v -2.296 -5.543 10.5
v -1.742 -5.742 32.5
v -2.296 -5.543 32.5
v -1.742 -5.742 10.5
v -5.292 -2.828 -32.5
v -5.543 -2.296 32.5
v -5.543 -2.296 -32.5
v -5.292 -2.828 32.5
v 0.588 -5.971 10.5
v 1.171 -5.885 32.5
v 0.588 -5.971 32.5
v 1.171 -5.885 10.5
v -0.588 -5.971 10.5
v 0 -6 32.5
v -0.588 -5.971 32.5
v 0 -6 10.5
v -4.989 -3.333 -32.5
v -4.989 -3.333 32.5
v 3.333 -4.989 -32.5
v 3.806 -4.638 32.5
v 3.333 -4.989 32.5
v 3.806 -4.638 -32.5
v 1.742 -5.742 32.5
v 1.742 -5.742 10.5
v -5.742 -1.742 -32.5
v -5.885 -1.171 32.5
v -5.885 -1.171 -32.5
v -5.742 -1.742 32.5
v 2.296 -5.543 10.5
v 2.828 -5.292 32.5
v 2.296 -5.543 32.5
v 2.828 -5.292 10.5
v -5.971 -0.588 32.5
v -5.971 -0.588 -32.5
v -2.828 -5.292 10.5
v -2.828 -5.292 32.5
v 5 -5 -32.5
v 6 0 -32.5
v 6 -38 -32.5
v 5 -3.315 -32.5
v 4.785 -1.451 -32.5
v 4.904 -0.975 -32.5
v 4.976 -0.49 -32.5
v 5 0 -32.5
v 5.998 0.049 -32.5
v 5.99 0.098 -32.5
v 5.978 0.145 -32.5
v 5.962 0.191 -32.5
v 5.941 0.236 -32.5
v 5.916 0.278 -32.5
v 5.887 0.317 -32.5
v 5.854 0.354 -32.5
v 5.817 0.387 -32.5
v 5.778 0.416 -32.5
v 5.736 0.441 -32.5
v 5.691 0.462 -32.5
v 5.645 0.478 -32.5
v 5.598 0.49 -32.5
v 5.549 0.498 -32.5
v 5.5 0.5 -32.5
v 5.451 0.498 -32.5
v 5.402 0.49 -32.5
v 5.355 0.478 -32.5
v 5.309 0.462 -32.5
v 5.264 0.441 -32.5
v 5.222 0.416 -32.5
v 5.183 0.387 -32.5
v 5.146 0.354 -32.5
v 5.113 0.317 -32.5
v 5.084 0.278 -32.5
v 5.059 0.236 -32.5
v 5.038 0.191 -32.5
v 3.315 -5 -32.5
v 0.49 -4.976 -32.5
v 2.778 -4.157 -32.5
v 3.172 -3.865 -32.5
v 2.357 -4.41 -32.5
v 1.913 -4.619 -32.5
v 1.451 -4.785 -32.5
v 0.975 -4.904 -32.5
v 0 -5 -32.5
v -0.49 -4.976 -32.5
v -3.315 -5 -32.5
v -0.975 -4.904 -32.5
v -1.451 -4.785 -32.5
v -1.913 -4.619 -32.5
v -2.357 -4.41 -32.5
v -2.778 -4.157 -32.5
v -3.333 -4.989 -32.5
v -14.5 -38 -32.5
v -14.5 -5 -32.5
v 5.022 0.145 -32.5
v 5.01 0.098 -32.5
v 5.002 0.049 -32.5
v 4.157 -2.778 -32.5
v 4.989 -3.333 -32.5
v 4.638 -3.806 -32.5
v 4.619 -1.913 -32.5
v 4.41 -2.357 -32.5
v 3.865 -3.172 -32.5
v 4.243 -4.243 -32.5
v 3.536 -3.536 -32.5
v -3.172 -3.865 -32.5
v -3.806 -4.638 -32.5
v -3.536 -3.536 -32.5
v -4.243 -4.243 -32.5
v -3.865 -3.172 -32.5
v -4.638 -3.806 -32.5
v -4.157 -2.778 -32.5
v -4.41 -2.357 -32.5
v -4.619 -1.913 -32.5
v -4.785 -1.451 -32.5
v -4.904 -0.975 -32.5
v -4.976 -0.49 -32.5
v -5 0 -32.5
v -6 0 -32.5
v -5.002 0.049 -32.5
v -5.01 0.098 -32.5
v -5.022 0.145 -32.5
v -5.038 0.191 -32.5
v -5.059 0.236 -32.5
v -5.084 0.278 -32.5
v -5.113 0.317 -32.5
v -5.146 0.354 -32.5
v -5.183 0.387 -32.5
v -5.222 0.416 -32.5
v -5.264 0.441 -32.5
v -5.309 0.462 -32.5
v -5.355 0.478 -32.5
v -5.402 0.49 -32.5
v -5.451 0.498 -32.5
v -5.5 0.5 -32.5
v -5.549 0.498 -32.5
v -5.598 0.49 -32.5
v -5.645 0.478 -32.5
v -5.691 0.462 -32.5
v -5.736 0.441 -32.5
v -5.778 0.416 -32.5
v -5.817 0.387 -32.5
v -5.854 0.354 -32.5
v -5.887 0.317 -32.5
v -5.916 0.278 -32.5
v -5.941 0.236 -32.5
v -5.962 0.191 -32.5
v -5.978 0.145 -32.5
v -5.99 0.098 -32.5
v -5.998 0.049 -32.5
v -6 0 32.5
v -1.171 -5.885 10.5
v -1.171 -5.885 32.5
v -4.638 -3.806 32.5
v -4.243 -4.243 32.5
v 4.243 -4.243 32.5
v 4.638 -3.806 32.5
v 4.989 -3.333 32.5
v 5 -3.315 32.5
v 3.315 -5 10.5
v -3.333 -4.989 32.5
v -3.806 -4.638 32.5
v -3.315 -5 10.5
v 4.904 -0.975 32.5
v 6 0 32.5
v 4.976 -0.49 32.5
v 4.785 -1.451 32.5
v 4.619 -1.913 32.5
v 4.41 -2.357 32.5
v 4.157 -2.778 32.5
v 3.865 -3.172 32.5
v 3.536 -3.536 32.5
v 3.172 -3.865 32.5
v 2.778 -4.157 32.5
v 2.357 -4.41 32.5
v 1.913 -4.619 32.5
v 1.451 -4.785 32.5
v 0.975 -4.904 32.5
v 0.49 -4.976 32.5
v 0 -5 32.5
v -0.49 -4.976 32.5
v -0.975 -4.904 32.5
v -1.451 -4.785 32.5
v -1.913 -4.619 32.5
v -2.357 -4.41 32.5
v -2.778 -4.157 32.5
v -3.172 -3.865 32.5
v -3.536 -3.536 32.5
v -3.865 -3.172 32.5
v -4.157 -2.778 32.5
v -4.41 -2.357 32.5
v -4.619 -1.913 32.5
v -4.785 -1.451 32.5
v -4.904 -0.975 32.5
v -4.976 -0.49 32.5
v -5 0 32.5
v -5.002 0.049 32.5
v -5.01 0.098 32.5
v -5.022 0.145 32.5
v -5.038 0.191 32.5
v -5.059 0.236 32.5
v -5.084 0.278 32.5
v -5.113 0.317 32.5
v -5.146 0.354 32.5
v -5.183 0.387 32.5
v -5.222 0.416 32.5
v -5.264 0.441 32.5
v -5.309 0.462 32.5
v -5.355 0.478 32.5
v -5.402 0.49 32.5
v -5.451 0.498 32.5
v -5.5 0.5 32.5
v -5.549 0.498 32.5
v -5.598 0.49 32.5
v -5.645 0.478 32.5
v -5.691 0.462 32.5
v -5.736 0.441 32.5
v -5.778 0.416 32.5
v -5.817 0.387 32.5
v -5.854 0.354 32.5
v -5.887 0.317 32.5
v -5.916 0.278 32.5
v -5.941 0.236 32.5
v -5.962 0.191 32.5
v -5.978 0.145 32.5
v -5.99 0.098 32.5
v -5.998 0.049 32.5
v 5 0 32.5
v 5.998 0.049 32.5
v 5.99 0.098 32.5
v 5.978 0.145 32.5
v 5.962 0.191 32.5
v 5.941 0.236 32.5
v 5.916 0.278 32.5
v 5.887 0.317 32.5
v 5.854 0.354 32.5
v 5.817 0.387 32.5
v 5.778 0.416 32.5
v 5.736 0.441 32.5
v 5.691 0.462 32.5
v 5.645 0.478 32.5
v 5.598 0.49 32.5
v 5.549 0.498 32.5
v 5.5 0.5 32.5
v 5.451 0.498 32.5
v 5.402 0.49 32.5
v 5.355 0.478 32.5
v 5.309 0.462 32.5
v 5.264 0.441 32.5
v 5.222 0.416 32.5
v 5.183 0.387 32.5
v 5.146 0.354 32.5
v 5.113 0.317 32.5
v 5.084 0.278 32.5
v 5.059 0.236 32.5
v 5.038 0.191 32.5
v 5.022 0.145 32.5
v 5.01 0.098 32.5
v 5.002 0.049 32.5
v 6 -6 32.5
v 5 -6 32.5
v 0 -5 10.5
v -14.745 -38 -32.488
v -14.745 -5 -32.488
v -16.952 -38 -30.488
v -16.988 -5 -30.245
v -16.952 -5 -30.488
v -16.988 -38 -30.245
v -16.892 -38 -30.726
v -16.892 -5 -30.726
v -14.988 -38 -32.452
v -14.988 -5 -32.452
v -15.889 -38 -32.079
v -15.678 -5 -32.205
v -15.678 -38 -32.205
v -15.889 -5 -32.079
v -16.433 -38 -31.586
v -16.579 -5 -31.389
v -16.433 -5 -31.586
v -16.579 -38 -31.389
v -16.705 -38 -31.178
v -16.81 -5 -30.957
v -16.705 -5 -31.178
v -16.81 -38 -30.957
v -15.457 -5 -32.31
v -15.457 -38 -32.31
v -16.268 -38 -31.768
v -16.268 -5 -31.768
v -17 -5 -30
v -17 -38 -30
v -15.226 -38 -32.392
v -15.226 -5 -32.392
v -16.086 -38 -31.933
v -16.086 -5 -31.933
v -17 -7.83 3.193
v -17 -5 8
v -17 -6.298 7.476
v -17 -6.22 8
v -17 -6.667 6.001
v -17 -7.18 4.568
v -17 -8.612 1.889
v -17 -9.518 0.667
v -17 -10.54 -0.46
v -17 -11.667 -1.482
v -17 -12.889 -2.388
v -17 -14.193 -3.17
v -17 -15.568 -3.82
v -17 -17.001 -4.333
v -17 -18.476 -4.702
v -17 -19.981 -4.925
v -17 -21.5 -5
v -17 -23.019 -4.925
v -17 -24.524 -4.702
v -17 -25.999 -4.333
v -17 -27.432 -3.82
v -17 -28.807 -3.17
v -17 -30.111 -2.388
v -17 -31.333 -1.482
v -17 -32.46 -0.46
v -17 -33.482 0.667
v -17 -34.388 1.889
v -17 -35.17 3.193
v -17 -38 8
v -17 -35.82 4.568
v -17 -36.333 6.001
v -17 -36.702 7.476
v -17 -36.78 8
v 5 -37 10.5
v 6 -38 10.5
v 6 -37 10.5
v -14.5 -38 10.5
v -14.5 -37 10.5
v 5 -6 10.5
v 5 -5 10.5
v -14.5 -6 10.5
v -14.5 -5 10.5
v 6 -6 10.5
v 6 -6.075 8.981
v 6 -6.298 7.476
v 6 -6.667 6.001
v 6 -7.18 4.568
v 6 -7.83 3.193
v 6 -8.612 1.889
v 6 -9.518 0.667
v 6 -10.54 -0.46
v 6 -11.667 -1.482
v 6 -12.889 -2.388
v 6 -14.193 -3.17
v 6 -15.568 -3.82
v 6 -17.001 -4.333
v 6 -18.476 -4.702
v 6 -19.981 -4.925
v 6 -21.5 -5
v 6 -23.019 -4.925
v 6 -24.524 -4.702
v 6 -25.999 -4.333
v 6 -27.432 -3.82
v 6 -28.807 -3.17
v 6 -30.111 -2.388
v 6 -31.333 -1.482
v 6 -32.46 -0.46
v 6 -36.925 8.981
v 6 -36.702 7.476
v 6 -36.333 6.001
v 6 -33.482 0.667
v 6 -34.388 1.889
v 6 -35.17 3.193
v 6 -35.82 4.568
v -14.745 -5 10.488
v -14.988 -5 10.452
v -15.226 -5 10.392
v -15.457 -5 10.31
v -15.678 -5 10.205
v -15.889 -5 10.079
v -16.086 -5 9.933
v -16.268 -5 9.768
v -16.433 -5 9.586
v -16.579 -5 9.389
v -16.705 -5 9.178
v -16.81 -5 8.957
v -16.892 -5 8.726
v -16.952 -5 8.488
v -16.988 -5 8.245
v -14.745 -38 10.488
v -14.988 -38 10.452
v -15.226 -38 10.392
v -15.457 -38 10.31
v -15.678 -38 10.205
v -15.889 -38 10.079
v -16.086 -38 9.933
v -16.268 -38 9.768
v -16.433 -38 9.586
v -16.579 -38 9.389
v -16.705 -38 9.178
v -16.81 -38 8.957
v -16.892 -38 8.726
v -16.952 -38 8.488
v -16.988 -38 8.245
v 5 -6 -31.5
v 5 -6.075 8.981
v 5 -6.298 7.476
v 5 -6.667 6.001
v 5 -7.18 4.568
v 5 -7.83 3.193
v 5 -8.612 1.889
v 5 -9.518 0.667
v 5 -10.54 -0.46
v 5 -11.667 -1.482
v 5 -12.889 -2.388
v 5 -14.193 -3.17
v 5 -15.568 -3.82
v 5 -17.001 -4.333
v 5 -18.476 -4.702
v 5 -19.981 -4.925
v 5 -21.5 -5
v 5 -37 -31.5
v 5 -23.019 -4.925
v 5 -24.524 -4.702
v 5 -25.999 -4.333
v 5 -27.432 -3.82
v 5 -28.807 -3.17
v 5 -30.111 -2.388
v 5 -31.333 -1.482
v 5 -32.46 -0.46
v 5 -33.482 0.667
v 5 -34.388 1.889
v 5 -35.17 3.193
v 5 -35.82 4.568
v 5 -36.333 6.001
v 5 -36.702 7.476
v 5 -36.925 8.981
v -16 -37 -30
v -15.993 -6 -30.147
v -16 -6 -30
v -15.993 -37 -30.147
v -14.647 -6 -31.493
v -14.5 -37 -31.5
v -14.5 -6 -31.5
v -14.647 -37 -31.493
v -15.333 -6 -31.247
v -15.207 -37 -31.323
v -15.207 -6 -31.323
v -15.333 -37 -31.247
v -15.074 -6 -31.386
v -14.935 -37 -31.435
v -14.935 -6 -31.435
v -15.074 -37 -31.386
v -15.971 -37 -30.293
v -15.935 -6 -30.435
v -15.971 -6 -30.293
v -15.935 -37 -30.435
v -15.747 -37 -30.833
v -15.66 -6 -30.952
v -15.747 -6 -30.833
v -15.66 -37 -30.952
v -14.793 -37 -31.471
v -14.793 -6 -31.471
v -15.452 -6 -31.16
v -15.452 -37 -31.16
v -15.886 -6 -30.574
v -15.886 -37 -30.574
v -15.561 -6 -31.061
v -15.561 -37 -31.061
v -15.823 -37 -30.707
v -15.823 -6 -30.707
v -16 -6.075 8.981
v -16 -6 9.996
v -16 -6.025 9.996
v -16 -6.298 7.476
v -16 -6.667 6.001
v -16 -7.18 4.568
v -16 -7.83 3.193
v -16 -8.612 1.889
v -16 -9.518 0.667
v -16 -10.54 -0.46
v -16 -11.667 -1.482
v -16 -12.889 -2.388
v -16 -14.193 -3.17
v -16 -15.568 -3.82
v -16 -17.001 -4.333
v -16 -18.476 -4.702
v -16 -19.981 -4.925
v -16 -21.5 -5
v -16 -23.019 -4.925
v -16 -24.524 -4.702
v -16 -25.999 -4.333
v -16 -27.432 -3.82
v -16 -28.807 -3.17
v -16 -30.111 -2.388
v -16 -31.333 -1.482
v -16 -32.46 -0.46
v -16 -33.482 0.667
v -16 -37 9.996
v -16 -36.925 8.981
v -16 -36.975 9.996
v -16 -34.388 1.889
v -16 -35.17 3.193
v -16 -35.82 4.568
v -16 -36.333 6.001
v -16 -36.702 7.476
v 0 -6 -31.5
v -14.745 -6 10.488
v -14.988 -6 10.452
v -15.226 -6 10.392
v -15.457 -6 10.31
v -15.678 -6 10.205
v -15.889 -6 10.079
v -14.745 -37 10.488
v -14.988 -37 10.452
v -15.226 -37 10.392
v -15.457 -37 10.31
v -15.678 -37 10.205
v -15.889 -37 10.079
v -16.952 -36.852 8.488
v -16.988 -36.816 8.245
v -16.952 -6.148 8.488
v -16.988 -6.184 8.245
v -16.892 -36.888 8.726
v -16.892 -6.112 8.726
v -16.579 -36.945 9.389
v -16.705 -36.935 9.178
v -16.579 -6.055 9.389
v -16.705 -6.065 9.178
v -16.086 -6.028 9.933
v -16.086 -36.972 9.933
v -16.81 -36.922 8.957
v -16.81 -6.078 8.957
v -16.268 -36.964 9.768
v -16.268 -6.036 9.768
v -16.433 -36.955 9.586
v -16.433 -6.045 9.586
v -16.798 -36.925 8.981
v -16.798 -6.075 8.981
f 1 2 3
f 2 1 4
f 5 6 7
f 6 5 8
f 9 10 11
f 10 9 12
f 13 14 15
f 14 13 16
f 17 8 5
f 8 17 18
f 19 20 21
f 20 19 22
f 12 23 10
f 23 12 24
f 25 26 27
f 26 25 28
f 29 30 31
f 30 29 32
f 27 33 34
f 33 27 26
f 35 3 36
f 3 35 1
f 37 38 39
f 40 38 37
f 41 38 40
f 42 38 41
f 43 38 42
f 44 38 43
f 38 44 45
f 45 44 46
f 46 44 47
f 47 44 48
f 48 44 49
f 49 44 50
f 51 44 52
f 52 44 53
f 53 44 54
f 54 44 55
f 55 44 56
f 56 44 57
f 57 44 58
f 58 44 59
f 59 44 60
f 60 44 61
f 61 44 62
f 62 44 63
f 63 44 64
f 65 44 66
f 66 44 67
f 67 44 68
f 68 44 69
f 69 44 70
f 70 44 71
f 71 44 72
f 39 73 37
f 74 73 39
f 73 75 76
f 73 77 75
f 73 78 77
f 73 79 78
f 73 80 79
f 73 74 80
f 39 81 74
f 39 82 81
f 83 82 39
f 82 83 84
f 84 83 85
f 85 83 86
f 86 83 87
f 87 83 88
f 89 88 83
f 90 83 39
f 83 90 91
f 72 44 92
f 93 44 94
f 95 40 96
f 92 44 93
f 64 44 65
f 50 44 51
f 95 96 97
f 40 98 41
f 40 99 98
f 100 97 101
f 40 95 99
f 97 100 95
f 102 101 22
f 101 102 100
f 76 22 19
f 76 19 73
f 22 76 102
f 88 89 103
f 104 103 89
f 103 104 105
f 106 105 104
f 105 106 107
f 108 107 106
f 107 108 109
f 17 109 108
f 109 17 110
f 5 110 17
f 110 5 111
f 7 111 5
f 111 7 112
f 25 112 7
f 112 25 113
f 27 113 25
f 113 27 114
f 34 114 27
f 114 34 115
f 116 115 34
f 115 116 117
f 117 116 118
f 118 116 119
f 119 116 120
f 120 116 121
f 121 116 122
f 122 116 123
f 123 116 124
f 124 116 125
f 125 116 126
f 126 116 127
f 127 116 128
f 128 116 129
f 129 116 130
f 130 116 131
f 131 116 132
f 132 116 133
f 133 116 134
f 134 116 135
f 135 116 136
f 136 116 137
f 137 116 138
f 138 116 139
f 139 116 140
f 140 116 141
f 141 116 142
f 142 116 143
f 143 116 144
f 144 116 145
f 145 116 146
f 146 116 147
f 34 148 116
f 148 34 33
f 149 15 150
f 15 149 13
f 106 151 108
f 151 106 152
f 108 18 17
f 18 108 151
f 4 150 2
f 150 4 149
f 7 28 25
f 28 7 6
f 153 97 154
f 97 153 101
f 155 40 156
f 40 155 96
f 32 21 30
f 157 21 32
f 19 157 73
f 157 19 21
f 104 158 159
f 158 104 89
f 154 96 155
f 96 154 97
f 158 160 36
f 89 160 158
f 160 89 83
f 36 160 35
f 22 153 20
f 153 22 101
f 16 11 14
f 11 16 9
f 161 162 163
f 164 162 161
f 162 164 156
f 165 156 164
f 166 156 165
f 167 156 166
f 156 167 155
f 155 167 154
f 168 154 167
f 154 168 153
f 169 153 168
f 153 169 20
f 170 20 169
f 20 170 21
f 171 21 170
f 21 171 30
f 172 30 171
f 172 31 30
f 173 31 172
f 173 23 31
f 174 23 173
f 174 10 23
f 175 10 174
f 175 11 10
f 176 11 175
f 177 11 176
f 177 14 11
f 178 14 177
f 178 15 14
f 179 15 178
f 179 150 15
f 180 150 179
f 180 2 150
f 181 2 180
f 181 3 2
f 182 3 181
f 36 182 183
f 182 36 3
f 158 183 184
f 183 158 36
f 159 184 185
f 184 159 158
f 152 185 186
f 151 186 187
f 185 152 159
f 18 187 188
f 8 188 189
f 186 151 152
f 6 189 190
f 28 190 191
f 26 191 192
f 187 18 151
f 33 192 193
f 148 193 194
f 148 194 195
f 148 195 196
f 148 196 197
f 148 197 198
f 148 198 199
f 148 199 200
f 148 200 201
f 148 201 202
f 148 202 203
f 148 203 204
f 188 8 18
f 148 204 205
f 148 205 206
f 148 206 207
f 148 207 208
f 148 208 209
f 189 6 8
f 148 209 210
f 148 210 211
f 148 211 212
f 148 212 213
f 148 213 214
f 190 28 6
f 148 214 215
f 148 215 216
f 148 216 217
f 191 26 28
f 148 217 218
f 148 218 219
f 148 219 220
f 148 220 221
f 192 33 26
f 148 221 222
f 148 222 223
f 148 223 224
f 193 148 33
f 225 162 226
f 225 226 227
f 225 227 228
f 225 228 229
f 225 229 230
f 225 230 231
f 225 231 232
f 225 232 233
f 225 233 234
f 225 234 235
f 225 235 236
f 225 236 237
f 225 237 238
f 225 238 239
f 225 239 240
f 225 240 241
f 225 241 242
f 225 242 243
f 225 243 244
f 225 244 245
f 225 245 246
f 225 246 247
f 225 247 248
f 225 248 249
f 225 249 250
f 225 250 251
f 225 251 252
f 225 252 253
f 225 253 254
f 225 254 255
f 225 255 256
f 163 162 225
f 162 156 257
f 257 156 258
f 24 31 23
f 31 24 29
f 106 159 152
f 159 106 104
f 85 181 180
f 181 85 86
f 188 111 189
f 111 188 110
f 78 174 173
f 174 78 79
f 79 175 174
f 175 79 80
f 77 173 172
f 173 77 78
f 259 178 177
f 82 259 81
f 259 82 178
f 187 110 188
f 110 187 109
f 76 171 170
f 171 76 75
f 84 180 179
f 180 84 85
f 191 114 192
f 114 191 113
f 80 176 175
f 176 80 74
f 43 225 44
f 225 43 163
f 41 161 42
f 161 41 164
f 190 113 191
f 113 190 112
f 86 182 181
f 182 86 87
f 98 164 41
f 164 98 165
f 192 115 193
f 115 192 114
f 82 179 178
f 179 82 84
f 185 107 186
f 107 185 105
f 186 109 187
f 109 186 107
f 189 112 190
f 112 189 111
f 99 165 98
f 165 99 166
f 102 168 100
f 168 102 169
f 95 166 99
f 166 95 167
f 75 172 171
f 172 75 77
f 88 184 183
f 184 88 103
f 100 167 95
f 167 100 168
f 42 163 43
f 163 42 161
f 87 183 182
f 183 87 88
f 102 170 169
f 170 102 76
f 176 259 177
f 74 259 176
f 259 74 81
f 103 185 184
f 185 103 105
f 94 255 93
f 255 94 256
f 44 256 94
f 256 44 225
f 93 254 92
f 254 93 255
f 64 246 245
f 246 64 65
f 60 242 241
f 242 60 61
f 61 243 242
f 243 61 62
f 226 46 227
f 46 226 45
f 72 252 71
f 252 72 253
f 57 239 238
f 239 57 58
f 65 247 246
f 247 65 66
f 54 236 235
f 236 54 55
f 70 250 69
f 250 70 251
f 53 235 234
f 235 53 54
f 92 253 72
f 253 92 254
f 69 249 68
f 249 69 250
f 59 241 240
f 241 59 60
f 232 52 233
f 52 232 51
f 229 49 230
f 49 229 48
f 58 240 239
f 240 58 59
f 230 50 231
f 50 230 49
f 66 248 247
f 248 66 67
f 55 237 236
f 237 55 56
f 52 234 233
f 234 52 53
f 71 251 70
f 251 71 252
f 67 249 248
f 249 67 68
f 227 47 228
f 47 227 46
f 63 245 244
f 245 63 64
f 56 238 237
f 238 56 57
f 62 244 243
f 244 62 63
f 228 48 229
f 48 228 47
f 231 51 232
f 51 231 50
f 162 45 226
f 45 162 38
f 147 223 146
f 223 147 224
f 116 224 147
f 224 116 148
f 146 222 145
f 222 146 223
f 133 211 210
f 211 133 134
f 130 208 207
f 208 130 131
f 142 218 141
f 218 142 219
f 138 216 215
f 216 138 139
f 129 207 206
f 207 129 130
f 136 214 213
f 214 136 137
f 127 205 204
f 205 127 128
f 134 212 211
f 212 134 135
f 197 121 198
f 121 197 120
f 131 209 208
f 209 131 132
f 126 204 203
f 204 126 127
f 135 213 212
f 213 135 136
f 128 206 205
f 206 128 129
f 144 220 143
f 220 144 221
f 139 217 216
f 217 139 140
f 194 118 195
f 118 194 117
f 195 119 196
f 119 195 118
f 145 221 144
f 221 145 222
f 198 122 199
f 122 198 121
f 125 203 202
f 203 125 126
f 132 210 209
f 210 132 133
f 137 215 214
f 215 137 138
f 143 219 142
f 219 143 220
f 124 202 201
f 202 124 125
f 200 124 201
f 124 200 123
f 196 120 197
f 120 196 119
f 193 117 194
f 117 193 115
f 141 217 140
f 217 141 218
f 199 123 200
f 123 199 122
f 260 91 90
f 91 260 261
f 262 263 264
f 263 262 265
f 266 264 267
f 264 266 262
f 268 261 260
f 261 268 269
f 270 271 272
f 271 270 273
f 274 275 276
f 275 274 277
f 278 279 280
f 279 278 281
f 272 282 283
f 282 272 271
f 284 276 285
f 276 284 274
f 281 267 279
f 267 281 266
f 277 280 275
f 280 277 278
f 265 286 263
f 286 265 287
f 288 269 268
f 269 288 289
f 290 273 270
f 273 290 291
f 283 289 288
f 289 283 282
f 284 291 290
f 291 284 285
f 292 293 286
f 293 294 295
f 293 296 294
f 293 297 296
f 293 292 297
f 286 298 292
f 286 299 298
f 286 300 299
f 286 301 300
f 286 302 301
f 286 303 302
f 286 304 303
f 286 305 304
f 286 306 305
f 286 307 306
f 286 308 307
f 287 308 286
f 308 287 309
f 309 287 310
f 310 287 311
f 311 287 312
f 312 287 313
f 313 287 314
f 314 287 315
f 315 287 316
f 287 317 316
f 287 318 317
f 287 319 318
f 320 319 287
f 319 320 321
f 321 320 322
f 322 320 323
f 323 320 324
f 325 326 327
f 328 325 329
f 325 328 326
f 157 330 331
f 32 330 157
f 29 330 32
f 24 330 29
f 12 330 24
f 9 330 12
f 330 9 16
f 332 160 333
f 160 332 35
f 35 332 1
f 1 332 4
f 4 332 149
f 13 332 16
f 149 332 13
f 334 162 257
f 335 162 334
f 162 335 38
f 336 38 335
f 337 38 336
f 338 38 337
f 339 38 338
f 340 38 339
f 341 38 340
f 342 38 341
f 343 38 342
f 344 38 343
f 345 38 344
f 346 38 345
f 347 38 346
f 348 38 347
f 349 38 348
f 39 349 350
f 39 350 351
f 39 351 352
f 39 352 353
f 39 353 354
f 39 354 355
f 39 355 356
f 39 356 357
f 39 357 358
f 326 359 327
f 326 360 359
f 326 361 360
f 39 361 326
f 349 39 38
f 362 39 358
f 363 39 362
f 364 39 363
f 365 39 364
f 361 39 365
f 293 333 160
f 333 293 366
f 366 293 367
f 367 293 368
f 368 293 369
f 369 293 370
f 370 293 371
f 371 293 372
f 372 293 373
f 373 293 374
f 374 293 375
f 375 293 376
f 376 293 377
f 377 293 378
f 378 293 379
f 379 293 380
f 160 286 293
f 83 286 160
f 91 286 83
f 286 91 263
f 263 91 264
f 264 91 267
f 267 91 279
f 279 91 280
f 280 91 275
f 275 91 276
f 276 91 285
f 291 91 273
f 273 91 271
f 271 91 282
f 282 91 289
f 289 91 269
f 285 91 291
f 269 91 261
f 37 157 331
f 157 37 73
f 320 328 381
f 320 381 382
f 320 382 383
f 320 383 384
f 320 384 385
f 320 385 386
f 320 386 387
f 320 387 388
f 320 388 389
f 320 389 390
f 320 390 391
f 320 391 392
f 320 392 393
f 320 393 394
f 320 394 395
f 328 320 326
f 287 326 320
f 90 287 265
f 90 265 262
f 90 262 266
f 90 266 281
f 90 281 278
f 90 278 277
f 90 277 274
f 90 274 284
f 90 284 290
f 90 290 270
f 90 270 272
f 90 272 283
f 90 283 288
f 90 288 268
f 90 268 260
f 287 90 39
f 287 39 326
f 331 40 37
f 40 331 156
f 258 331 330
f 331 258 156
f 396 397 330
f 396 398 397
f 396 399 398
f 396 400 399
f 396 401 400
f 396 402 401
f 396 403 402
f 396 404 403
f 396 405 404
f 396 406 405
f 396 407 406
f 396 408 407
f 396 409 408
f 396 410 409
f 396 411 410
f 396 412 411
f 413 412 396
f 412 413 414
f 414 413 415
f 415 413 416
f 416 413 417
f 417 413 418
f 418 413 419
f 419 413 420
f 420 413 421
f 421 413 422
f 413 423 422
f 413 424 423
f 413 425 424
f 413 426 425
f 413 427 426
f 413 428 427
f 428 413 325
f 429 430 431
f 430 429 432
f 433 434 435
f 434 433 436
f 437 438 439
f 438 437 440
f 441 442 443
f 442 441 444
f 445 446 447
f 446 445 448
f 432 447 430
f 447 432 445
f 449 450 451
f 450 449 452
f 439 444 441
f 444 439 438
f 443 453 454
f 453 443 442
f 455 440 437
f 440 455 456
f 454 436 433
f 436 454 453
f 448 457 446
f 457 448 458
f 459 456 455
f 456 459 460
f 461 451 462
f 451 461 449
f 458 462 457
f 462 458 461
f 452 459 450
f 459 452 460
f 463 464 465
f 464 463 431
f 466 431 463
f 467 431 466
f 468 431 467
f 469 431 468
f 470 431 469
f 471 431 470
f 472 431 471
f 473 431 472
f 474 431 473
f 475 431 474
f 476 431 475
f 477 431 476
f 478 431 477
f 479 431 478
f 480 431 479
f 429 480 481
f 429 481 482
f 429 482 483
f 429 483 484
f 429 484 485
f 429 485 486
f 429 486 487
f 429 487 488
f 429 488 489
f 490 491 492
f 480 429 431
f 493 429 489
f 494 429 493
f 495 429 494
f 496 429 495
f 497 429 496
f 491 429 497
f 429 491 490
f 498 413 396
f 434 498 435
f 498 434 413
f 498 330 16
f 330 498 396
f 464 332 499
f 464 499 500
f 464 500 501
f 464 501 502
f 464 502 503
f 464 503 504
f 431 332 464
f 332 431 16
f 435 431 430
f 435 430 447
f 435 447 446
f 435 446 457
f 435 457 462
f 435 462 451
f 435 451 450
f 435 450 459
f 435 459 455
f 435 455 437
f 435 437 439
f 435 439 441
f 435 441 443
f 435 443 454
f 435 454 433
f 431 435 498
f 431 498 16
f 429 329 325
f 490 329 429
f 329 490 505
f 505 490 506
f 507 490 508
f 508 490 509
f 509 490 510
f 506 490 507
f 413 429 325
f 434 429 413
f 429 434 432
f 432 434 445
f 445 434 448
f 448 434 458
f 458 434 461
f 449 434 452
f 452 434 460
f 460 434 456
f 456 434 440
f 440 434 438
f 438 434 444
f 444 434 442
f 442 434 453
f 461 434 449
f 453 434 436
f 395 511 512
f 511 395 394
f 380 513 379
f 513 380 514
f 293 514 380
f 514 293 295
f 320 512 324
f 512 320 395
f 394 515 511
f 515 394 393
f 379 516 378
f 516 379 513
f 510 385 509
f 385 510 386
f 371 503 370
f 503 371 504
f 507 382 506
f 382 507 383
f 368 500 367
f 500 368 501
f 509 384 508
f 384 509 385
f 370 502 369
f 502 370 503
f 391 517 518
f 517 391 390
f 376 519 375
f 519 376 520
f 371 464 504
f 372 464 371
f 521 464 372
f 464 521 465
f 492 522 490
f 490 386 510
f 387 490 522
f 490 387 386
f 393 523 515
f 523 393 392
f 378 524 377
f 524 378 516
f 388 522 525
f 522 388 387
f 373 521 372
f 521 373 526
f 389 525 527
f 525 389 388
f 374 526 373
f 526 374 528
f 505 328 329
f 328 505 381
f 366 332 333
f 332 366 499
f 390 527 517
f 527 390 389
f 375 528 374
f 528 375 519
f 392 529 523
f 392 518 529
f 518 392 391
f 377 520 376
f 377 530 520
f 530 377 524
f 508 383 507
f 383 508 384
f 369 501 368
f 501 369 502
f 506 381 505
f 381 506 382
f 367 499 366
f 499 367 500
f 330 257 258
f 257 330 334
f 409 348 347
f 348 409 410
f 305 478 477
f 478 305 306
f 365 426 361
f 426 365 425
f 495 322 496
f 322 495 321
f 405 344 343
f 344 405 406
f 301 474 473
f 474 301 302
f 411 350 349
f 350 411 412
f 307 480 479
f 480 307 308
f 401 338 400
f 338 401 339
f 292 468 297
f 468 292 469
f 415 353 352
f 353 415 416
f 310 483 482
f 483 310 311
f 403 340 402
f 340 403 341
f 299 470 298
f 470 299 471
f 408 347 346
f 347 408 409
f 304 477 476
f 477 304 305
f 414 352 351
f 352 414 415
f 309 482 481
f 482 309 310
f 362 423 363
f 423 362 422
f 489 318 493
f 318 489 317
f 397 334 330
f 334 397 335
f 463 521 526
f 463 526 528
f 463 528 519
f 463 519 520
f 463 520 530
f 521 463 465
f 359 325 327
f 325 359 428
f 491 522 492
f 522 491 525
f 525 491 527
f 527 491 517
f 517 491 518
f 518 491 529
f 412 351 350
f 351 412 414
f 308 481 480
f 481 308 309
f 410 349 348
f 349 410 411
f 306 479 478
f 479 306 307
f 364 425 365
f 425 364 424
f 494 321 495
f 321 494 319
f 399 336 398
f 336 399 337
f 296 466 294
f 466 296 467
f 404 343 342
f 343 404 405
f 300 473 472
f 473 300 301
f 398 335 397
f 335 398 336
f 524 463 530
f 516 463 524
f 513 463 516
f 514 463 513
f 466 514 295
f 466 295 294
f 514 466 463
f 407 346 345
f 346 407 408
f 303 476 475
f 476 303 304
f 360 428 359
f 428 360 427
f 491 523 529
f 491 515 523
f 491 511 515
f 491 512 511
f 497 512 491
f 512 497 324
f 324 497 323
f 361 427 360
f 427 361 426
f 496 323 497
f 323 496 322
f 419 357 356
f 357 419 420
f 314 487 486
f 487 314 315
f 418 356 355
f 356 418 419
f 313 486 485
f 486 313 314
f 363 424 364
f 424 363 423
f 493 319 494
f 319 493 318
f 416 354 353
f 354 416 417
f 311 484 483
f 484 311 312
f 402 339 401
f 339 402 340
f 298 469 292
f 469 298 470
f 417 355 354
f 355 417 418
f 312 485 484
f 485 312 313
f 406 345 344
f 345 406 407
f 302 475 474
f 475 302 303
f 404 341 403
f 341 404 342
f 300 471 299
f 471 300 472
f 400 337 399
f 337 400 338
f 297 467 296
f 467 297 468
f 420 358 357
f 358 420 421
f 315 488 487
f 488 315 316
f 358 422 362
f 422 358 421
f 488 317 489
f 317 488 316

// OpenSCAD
//set the type of holder
OpenTo="right"; //["left":left side open, "right":right side open, "cut_for_debug":cut out to see the inside]

//Chalk radius in mm
chalk_r=4.5;

//Chalk holder length in mm
chalk_l=65;

//sponge width in mm
sponge_w=40;

//sponge height in mm
sponge_h=30;

//sponge thickness in mm
sponge_th=20;

//Wall thickness in mm
wall=1;

/* [Hidden] */

$fn=64;

wiggle=.5;
flatlen=15;//for tesa powerstrips
holder_in_r=chalk_r+wiggle;
holder_out_r=chalk_r+wall+wiggle;

edge_cutoff=wall*5;

/*
Chalk and sponge holder
Version 9, February 2015
Written by MC Geisler (mcgenki at gmail dot com)

A convenient storage for your blackboard accessories.

Have fun!

License: Attribution 4.0 International (CC BY 4.0)

You are free to:
    Share - copy and redistribute the material in any medium or format
    Adapt - remix, transform, and build upon the material
    for any purpose, even commercially.
*/

module half_pipe()
{
    //half pipe
    difference()
    {
        cylinder(r=holder_out_r,h=chalk_l,center=true); 
        cylinder(r=holder_in_r,h=chalk_l*2,center=true);
        translate([0,chalk_l/2,0])
            cube([chalk_l,chalk_l,chalk_l+2],center=true);
    }

    //stabilize the half pipe
    //translate([-chalk_r-wiggle-wall/2,-flatlen/2,0])
    //    cube([wall,flatlen,chalk_l],center=true);

    //half pipe edges rounded
    edge_pos=chalk_r+wiggle+wall/2;
    translate([-edge_pos,0,0])
        cylinder(r=wall/2,h=chalk_l,center=true);
    translate([edge_pos,0,0])
        cylinder(r=wall/2,h=chalk_l,center=true);
}
            
module box_rounded(a,b,c,edge_cutoff)
{
    difference()
    {
        cube([a,b,c],center=true);

        translate([a/2,0,-c/2])
            difference()
            {
                cube([edge_cutoff,b*2,edge_cutoff],center=true);
                
                translate([-edge_cutoff/2,0,edge_cutoff/2])
                    rotate([90,0,0])
                        cylinder(r=edge_cutoff/2,h=b*2,center=true);
            }
   }
}

module sponge_box()
{       
    outer_th=sponge_th+2*(wall+wiggle);
    outer_h=sponge_h+2*(wall+wiggle);
    outer_w=sponge_w+2*(wall+wiggle);
    
    //sponge box
    translate([     outer_th/2-holder_out_r,
                    -outer_h/2-holder_out_r+wall,
                    outer_w/2-chalk_l/2      ])
        difference()
        {
            union()
            {
                //outer cube
                box_rounded(outer_th,outer_h,outer_w,edge_cutoff);
                                
                //stabilize the half pipe with a wall adder
                translate([-sponge_th/2-wiggle-wall/2,
                        -flatlen/2+sponge_h/2+wiggle+holder_out_r,
                        -(sponge_w+2*(wall+wiggle))/2+chalk_l/2 ])
                    cube([wall,flatlen,chalk_l],center=true);
            }

            //cut out sponge
            translate([0,0,sponge_w/2])
                box_rounded(sponge_th+2*wiggle,sponge_h+2*wiggle,sponge_w+2*wiggle+sponge_w,edge_cutoff-wall*2);
            
           //cut out the stabilizer
           translate([0,0,sponge_w/2+sponge_w+wiggle*2+wall])
                cube([sponge_th*2,sponge_h+2*wiggle,sponge_w+2*wiggle+sponge_w],center=true);
            
            //cut out for the fingers
            translate([0,0,sponge_w/2+(wall+wiggle)])
                rotate([0,90,0])
                    cylinder(r=(sponge_h+2*wiggle)/2,h=sponge_th*2,center=true);

            //cut off side edges to be safer
            translate([outer_th/2,outer_h/2*0,outer_w/2])
                difference()
                {
                    cube([edge_cutoff,sponge_h*2,edge_cutoff],center=true);
                    translate([-edge_cutoff/2,0,-edge_cutoff/2])
                        rotate([90,0,0])
                            cylinder(r=edge_cutoff/2,h=sponge_h*2,center=true);
                }
               
        }
}                                 

module holder()
{
    half_pipe();
    sponge_box();
}

if (OpenTo=="left")
{
    holder();
}
else
{
    if (OpenTo=="right")
    {
        rotate([0,180,0])
            mirror([0,0,1])
            {
                holder();
            }
    }
    else
    {
        if (OpenTo=="cut_for_debug")
        {
            rotate([0,180,0])
                mirror([0,0,1])
                {
                    difference()
                    {
                        holder();
                        translate([0,-25,-50]) cube(30);
                    }
                }
        }        
    }  
}
